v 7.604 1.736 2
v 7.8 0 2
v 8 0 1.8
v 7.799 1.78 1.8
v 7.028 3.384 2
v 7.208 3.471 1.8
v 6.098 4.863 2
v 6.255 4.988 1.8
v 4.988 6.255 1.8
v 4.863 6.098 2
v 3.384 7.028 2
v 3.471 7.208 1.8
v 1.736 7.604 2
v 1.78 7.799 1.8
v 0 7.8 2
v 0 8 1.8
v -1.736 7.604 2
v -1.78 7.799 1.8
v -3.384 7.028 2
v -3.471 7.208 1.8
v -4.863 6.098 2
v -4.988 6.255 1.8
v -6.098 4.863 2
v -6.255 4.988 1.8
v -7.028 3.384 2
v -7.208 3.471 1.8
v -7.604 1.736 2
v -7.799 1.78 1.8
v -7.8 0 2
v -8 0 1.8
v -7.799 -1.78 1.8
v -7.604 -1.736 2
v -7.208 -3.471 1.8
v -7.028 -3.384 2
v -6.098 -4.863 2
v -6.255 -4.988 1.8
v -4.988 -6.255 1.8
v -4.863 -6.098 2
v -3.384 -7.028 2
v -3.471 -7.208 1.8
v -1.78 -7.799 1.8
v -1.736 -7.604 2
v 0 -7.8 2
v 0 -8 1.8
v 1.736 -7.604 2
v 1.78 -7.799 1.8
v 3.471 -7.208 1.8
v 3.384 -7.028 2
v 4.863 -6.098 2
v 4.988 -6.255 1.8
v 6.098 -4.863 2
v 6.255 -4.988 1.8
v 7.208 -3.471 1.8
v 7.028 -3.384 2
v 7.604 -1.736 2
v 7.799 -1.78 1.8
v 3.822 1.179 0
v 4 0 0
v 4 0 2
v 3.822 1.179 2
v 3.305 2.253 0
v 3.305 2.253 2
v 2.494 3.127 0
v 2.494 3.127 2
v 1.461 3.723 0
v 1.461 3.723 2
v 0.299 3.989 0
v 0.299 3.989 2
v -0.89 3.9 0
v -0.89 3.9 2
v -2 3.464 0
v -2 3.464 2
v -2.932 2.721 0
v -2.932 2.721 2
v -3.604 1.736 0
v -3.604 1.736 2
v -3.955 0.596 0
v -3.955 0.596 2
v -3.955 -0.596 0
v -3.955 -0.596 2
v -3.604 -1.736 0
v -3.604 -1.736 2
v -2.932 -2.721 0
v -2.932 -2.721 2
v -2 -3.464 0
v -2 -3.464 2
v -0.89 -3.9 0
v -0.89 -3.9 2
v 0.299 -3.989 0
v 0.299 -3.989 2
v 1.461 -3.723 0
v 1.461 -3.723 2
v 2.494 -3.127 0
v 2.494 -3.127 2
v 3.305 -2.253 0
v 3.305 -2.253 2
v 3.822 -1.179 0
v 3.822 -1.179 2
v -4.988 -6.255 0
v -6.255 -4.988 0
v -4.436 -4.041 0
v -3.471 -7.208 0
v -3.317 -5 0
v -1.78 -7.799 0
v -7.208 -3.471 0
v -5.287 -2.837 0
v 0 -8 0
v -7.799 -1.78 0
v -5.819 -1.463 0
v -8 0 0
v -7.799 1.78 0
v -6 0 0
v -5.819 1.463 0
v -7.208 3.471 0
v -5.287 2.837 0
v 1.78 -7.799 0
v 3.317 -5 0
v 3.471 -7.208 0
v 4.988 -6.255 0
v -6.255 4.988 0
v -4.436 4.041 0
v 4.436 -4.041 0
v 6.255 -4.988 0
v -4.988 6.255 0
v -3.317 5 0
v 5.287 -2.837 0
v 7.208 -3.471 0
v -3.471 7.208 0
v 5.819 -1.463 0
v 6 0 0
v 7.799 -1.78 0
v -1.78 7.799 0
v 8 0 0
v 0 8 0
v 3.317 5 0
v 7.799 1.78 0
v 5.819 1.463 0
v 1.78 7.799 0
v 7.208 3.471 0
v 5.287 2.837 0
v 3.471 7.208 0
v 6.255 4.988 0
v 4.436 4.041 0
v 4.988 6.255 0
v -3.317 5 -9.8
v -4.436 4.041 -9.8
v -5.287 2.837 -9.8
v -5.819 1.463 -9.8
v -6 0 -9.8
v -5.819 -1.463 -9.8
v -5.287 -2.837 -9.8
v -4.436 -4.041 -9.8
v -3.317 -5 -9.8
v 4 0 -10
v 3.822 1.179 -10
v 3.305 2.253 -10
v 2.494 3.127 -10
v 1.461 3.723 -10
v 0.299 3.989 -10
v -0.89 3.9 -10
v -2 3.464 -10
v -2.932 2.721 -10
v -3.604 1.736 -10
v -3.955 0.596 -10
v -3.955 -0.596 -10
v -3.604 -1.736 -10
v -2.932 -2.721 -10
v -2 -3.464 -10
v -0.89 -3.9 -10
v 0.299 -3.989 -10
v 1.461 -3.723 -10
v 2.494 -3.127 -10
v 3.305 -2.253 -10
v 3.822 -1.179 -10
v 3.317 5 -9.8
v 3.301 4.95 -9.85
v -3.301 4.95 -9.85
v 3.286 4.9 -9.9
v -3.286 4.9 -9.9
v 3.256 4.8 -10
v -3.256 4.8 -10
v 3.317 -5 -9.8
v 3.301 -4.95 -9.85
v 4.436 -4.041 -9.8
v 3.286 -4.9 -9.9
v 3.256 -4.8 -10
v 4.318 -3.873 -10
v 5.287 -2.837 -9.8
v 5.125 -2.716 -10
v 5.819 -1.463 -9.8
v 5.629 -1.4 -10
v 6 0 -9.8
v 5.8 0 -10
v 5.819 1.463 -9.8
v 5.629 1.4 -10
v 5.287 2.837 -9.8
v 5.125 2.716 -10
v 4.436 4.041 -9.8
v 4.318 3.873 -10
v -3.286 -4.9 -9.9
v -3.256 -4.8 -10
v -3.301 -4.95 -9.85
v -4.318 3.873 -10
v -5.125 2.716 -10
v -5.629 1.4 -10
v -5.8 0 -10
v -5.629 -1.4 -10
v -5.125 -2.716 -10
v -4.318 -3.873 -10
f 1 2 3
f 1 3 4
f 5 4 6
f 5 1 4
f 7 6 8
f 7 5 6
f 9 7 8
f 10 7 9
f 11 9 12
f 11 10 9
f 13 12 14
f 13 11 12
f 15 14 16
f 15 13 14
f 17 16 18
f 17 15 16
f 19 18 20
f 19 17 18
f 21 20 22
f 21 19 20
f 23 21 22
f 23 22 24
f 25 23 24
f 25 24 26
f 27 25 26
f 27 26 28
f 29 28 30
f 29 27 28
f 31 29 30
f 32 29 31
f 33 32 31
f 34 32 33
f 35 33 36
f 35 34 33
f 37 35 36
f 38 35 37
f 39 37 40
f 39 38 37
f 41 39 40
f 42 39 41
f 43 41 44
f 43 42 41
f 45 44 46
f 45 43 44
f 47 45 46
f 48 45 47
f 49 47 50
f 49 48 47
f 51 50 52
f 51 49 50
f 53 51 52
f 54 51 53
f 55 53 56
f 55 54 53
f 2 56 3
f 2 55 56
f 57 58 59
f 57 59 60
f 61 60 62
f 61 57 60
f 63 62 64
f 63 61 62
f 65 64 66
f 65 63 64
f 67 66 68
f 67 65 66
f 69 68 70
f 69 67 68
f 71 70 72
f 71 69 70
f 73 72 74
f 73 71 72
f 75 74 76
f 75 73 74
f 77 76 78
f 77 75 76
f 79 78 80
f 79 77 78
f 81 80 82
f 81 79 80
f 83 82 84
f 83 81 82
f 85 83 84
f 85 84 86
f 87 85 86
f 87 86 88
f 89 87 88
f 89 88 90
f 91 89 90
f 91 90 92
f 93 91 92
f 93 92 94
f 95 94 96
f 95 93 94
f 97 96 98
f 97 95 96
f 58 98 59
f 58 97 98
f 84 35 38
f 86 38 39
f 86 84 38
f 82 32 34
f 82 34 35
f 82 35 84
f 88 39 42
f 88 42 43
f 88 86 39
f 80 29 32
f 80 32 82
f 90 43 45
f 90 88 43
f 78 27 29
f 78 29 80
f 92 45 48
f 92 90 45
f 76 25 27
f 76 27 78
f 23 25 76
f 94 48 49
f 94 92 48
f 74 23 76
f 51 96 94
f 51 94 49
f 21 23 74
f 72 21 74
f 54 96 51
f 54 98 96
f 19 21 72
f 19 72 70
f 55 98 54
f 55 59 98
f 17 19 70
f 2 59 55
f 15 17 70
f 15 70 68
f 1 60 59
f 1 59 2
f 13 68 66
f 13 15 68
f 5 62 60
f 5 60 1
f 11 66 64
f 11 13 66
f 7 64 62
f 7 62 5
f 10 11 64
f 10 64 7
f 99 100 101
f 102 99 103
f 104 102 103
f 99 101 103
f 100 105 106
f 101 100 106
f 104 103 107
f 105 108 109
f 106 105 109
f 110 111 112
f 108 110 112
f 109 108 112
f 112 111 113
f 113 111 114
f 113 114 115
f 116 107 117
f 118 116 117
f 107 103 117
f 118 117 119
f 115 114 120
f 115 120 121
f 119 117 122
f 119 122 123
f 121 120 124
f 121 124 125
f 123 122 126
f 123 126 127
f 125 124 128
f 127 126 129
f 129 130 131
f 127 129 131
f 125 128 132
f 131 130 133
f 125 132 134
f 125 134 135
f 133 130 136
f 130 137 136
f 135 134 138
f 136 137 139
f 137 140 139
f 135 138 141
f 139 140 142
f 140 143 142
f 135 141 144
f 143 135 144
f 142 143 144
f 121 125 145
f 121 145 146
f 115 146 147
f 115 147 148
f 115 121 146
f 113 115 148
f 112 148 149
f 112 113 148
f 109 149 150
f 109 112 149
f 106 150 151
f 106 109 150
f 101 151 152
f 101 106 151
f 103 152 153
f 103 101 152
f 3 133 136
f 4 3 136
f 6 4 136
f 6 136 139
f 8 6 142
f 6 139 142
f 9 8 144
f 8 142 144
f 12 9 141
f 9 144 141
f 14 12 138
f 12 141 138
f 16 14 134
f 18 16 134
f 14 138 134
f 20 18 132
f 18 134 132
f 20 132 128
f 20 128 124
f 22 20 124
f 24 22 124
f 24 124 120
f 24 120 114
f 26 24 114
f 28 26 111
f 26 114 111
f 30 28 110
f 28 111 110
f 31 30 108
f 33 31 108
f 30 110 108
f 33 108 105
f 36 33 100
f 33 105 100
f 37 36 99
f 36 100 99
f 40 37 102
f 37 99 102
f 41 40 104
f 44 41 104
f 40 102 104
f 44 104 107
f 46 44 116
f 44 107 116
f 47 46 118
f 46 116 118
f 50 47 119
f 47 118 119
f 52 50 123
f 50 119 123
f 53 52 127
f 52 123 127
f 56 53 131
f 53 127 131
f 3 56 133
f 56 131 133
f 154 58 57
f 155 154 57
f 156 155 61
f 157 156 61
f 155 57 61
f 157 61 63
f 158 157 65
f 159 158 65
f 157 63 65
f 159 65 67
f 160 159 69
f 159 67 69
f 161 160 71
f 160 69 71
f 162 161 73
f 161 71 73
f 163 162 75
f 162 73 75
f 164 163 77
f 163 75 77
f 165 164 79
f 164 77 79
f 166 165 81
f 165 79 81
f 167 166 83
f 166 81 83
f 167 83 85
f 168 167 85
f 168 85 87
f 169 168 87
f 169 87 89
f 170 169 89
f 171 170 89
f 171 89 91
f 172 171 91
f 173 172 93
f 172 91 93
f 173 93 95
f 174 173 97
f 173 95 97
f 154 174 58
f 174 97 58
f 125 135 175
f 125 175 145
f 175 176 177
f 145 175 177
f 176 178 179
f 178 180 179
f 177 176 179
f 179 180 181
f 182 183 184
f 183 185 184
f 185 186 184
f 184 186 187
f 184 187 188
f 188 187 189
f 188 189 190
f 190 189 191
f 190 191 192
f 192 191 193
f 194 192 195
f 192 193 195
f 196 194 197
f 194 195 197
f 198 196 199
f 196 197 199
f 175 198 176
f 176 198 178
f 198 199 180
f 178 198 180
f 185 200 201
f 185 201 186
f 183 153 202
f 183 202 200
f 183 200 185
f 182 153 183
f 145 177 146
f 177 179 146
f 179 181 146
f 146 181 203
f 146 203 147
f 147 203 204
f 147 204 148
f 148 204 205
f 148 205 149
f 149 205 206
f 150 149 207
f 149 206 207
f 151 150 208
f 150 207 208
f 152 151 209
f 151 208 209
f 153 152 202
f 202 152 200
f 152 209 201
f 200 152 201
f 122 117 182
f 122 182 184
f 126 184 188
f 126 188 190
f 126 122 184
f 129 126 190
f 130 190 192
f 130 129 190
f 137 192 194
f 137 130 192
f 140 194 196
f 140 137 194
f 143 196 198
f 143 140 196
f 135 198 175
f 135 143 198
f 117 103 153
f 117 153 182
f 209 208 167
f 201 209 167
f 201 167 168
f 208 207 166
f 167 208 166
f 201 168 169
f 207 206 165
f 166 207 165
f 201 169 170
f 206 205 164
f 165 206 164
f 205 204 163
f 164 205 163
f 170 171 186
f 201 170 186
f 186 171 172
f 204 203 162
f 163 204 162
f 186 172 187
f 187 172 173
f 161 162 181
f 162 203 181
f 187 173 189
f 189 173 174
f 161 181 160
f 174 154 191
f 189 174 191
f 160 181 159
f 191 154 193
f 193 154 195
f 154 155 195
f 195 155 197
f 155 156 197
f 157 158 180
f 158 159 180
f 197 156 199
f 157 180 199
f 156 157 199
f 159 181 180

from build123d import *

# Parameters (mm, degrees)
F0_R     = 8
F0_R_2   = 4
F1_DEPTH = 2
F2_DEPTH = 10
F3_SIZE  = 0.2


with BuildPart() as f1:
    # F0 (on Top) → F1 (new body)
    with BuildSketch(Plane.XY):
        Circle(F0_R)
        with BuildLine():
            ThreePointArc((-3.3166247904, -5), (-6, 0), (-3.3166247904, 5))
            Line((-3.3166247904, 5), (3.3166247904, 5))
            ThreePointArc((3.3166247904, 5), (6, 0), (3.3166247904, -5))
            Line((3.3166247904, -5), (-3.3166247904, -5))
        make_face(mode=Mode.SUBTRACT)
        with BuildLine():
            Line((3.3166247904, 5), (-3.3166247904, 5))
            ThreePointArc((-3.3166247904, 5), (-6, 0), (-3.3166247904, -5))
            Line((-3.3166247904, -5), (3.3166247904, -5))
            ThreePointArc((3.3166247904, -5), (6, 0), (3.3166247904, 5))
        make_face()
        Circle(F0_R_2, mode=Mode.SUBTRACT)
    extrude(amount=F1_DEPTH)

    # F0 (on Top) → F2 (join)
    with BuildSketch(Plane.XY):
        with BuildLine():
            Line((3.3166247904, 5), (-3.3166247904, 5))
            ThreePointArc((-3.3166247904, 5), (-6, 0), (-3.3166247904, -5))
            Line((-3.3166247904, -5), (3.3166247904, -5))
            ThreePointArc((3.3166247904, -5), (6, 0), (3.3166247904, 5))
        make_face()
        Circle(F0_R_2, mode=Mode.SUBTRACT)
    extrude(amount=-F2_DEPTH)

    # F3
    f3_edges = [f1.edges().sort_by_distance(p)[0] for p in [
        (-8, 0, 2),
        (-6, 0, -10),
        (0, 5, -10),
        (6, 0, -10),
        (0, -5, -10),
    ]]
    chamfer(f3_edges, length=F3_SIZE)


solid = f1.part
